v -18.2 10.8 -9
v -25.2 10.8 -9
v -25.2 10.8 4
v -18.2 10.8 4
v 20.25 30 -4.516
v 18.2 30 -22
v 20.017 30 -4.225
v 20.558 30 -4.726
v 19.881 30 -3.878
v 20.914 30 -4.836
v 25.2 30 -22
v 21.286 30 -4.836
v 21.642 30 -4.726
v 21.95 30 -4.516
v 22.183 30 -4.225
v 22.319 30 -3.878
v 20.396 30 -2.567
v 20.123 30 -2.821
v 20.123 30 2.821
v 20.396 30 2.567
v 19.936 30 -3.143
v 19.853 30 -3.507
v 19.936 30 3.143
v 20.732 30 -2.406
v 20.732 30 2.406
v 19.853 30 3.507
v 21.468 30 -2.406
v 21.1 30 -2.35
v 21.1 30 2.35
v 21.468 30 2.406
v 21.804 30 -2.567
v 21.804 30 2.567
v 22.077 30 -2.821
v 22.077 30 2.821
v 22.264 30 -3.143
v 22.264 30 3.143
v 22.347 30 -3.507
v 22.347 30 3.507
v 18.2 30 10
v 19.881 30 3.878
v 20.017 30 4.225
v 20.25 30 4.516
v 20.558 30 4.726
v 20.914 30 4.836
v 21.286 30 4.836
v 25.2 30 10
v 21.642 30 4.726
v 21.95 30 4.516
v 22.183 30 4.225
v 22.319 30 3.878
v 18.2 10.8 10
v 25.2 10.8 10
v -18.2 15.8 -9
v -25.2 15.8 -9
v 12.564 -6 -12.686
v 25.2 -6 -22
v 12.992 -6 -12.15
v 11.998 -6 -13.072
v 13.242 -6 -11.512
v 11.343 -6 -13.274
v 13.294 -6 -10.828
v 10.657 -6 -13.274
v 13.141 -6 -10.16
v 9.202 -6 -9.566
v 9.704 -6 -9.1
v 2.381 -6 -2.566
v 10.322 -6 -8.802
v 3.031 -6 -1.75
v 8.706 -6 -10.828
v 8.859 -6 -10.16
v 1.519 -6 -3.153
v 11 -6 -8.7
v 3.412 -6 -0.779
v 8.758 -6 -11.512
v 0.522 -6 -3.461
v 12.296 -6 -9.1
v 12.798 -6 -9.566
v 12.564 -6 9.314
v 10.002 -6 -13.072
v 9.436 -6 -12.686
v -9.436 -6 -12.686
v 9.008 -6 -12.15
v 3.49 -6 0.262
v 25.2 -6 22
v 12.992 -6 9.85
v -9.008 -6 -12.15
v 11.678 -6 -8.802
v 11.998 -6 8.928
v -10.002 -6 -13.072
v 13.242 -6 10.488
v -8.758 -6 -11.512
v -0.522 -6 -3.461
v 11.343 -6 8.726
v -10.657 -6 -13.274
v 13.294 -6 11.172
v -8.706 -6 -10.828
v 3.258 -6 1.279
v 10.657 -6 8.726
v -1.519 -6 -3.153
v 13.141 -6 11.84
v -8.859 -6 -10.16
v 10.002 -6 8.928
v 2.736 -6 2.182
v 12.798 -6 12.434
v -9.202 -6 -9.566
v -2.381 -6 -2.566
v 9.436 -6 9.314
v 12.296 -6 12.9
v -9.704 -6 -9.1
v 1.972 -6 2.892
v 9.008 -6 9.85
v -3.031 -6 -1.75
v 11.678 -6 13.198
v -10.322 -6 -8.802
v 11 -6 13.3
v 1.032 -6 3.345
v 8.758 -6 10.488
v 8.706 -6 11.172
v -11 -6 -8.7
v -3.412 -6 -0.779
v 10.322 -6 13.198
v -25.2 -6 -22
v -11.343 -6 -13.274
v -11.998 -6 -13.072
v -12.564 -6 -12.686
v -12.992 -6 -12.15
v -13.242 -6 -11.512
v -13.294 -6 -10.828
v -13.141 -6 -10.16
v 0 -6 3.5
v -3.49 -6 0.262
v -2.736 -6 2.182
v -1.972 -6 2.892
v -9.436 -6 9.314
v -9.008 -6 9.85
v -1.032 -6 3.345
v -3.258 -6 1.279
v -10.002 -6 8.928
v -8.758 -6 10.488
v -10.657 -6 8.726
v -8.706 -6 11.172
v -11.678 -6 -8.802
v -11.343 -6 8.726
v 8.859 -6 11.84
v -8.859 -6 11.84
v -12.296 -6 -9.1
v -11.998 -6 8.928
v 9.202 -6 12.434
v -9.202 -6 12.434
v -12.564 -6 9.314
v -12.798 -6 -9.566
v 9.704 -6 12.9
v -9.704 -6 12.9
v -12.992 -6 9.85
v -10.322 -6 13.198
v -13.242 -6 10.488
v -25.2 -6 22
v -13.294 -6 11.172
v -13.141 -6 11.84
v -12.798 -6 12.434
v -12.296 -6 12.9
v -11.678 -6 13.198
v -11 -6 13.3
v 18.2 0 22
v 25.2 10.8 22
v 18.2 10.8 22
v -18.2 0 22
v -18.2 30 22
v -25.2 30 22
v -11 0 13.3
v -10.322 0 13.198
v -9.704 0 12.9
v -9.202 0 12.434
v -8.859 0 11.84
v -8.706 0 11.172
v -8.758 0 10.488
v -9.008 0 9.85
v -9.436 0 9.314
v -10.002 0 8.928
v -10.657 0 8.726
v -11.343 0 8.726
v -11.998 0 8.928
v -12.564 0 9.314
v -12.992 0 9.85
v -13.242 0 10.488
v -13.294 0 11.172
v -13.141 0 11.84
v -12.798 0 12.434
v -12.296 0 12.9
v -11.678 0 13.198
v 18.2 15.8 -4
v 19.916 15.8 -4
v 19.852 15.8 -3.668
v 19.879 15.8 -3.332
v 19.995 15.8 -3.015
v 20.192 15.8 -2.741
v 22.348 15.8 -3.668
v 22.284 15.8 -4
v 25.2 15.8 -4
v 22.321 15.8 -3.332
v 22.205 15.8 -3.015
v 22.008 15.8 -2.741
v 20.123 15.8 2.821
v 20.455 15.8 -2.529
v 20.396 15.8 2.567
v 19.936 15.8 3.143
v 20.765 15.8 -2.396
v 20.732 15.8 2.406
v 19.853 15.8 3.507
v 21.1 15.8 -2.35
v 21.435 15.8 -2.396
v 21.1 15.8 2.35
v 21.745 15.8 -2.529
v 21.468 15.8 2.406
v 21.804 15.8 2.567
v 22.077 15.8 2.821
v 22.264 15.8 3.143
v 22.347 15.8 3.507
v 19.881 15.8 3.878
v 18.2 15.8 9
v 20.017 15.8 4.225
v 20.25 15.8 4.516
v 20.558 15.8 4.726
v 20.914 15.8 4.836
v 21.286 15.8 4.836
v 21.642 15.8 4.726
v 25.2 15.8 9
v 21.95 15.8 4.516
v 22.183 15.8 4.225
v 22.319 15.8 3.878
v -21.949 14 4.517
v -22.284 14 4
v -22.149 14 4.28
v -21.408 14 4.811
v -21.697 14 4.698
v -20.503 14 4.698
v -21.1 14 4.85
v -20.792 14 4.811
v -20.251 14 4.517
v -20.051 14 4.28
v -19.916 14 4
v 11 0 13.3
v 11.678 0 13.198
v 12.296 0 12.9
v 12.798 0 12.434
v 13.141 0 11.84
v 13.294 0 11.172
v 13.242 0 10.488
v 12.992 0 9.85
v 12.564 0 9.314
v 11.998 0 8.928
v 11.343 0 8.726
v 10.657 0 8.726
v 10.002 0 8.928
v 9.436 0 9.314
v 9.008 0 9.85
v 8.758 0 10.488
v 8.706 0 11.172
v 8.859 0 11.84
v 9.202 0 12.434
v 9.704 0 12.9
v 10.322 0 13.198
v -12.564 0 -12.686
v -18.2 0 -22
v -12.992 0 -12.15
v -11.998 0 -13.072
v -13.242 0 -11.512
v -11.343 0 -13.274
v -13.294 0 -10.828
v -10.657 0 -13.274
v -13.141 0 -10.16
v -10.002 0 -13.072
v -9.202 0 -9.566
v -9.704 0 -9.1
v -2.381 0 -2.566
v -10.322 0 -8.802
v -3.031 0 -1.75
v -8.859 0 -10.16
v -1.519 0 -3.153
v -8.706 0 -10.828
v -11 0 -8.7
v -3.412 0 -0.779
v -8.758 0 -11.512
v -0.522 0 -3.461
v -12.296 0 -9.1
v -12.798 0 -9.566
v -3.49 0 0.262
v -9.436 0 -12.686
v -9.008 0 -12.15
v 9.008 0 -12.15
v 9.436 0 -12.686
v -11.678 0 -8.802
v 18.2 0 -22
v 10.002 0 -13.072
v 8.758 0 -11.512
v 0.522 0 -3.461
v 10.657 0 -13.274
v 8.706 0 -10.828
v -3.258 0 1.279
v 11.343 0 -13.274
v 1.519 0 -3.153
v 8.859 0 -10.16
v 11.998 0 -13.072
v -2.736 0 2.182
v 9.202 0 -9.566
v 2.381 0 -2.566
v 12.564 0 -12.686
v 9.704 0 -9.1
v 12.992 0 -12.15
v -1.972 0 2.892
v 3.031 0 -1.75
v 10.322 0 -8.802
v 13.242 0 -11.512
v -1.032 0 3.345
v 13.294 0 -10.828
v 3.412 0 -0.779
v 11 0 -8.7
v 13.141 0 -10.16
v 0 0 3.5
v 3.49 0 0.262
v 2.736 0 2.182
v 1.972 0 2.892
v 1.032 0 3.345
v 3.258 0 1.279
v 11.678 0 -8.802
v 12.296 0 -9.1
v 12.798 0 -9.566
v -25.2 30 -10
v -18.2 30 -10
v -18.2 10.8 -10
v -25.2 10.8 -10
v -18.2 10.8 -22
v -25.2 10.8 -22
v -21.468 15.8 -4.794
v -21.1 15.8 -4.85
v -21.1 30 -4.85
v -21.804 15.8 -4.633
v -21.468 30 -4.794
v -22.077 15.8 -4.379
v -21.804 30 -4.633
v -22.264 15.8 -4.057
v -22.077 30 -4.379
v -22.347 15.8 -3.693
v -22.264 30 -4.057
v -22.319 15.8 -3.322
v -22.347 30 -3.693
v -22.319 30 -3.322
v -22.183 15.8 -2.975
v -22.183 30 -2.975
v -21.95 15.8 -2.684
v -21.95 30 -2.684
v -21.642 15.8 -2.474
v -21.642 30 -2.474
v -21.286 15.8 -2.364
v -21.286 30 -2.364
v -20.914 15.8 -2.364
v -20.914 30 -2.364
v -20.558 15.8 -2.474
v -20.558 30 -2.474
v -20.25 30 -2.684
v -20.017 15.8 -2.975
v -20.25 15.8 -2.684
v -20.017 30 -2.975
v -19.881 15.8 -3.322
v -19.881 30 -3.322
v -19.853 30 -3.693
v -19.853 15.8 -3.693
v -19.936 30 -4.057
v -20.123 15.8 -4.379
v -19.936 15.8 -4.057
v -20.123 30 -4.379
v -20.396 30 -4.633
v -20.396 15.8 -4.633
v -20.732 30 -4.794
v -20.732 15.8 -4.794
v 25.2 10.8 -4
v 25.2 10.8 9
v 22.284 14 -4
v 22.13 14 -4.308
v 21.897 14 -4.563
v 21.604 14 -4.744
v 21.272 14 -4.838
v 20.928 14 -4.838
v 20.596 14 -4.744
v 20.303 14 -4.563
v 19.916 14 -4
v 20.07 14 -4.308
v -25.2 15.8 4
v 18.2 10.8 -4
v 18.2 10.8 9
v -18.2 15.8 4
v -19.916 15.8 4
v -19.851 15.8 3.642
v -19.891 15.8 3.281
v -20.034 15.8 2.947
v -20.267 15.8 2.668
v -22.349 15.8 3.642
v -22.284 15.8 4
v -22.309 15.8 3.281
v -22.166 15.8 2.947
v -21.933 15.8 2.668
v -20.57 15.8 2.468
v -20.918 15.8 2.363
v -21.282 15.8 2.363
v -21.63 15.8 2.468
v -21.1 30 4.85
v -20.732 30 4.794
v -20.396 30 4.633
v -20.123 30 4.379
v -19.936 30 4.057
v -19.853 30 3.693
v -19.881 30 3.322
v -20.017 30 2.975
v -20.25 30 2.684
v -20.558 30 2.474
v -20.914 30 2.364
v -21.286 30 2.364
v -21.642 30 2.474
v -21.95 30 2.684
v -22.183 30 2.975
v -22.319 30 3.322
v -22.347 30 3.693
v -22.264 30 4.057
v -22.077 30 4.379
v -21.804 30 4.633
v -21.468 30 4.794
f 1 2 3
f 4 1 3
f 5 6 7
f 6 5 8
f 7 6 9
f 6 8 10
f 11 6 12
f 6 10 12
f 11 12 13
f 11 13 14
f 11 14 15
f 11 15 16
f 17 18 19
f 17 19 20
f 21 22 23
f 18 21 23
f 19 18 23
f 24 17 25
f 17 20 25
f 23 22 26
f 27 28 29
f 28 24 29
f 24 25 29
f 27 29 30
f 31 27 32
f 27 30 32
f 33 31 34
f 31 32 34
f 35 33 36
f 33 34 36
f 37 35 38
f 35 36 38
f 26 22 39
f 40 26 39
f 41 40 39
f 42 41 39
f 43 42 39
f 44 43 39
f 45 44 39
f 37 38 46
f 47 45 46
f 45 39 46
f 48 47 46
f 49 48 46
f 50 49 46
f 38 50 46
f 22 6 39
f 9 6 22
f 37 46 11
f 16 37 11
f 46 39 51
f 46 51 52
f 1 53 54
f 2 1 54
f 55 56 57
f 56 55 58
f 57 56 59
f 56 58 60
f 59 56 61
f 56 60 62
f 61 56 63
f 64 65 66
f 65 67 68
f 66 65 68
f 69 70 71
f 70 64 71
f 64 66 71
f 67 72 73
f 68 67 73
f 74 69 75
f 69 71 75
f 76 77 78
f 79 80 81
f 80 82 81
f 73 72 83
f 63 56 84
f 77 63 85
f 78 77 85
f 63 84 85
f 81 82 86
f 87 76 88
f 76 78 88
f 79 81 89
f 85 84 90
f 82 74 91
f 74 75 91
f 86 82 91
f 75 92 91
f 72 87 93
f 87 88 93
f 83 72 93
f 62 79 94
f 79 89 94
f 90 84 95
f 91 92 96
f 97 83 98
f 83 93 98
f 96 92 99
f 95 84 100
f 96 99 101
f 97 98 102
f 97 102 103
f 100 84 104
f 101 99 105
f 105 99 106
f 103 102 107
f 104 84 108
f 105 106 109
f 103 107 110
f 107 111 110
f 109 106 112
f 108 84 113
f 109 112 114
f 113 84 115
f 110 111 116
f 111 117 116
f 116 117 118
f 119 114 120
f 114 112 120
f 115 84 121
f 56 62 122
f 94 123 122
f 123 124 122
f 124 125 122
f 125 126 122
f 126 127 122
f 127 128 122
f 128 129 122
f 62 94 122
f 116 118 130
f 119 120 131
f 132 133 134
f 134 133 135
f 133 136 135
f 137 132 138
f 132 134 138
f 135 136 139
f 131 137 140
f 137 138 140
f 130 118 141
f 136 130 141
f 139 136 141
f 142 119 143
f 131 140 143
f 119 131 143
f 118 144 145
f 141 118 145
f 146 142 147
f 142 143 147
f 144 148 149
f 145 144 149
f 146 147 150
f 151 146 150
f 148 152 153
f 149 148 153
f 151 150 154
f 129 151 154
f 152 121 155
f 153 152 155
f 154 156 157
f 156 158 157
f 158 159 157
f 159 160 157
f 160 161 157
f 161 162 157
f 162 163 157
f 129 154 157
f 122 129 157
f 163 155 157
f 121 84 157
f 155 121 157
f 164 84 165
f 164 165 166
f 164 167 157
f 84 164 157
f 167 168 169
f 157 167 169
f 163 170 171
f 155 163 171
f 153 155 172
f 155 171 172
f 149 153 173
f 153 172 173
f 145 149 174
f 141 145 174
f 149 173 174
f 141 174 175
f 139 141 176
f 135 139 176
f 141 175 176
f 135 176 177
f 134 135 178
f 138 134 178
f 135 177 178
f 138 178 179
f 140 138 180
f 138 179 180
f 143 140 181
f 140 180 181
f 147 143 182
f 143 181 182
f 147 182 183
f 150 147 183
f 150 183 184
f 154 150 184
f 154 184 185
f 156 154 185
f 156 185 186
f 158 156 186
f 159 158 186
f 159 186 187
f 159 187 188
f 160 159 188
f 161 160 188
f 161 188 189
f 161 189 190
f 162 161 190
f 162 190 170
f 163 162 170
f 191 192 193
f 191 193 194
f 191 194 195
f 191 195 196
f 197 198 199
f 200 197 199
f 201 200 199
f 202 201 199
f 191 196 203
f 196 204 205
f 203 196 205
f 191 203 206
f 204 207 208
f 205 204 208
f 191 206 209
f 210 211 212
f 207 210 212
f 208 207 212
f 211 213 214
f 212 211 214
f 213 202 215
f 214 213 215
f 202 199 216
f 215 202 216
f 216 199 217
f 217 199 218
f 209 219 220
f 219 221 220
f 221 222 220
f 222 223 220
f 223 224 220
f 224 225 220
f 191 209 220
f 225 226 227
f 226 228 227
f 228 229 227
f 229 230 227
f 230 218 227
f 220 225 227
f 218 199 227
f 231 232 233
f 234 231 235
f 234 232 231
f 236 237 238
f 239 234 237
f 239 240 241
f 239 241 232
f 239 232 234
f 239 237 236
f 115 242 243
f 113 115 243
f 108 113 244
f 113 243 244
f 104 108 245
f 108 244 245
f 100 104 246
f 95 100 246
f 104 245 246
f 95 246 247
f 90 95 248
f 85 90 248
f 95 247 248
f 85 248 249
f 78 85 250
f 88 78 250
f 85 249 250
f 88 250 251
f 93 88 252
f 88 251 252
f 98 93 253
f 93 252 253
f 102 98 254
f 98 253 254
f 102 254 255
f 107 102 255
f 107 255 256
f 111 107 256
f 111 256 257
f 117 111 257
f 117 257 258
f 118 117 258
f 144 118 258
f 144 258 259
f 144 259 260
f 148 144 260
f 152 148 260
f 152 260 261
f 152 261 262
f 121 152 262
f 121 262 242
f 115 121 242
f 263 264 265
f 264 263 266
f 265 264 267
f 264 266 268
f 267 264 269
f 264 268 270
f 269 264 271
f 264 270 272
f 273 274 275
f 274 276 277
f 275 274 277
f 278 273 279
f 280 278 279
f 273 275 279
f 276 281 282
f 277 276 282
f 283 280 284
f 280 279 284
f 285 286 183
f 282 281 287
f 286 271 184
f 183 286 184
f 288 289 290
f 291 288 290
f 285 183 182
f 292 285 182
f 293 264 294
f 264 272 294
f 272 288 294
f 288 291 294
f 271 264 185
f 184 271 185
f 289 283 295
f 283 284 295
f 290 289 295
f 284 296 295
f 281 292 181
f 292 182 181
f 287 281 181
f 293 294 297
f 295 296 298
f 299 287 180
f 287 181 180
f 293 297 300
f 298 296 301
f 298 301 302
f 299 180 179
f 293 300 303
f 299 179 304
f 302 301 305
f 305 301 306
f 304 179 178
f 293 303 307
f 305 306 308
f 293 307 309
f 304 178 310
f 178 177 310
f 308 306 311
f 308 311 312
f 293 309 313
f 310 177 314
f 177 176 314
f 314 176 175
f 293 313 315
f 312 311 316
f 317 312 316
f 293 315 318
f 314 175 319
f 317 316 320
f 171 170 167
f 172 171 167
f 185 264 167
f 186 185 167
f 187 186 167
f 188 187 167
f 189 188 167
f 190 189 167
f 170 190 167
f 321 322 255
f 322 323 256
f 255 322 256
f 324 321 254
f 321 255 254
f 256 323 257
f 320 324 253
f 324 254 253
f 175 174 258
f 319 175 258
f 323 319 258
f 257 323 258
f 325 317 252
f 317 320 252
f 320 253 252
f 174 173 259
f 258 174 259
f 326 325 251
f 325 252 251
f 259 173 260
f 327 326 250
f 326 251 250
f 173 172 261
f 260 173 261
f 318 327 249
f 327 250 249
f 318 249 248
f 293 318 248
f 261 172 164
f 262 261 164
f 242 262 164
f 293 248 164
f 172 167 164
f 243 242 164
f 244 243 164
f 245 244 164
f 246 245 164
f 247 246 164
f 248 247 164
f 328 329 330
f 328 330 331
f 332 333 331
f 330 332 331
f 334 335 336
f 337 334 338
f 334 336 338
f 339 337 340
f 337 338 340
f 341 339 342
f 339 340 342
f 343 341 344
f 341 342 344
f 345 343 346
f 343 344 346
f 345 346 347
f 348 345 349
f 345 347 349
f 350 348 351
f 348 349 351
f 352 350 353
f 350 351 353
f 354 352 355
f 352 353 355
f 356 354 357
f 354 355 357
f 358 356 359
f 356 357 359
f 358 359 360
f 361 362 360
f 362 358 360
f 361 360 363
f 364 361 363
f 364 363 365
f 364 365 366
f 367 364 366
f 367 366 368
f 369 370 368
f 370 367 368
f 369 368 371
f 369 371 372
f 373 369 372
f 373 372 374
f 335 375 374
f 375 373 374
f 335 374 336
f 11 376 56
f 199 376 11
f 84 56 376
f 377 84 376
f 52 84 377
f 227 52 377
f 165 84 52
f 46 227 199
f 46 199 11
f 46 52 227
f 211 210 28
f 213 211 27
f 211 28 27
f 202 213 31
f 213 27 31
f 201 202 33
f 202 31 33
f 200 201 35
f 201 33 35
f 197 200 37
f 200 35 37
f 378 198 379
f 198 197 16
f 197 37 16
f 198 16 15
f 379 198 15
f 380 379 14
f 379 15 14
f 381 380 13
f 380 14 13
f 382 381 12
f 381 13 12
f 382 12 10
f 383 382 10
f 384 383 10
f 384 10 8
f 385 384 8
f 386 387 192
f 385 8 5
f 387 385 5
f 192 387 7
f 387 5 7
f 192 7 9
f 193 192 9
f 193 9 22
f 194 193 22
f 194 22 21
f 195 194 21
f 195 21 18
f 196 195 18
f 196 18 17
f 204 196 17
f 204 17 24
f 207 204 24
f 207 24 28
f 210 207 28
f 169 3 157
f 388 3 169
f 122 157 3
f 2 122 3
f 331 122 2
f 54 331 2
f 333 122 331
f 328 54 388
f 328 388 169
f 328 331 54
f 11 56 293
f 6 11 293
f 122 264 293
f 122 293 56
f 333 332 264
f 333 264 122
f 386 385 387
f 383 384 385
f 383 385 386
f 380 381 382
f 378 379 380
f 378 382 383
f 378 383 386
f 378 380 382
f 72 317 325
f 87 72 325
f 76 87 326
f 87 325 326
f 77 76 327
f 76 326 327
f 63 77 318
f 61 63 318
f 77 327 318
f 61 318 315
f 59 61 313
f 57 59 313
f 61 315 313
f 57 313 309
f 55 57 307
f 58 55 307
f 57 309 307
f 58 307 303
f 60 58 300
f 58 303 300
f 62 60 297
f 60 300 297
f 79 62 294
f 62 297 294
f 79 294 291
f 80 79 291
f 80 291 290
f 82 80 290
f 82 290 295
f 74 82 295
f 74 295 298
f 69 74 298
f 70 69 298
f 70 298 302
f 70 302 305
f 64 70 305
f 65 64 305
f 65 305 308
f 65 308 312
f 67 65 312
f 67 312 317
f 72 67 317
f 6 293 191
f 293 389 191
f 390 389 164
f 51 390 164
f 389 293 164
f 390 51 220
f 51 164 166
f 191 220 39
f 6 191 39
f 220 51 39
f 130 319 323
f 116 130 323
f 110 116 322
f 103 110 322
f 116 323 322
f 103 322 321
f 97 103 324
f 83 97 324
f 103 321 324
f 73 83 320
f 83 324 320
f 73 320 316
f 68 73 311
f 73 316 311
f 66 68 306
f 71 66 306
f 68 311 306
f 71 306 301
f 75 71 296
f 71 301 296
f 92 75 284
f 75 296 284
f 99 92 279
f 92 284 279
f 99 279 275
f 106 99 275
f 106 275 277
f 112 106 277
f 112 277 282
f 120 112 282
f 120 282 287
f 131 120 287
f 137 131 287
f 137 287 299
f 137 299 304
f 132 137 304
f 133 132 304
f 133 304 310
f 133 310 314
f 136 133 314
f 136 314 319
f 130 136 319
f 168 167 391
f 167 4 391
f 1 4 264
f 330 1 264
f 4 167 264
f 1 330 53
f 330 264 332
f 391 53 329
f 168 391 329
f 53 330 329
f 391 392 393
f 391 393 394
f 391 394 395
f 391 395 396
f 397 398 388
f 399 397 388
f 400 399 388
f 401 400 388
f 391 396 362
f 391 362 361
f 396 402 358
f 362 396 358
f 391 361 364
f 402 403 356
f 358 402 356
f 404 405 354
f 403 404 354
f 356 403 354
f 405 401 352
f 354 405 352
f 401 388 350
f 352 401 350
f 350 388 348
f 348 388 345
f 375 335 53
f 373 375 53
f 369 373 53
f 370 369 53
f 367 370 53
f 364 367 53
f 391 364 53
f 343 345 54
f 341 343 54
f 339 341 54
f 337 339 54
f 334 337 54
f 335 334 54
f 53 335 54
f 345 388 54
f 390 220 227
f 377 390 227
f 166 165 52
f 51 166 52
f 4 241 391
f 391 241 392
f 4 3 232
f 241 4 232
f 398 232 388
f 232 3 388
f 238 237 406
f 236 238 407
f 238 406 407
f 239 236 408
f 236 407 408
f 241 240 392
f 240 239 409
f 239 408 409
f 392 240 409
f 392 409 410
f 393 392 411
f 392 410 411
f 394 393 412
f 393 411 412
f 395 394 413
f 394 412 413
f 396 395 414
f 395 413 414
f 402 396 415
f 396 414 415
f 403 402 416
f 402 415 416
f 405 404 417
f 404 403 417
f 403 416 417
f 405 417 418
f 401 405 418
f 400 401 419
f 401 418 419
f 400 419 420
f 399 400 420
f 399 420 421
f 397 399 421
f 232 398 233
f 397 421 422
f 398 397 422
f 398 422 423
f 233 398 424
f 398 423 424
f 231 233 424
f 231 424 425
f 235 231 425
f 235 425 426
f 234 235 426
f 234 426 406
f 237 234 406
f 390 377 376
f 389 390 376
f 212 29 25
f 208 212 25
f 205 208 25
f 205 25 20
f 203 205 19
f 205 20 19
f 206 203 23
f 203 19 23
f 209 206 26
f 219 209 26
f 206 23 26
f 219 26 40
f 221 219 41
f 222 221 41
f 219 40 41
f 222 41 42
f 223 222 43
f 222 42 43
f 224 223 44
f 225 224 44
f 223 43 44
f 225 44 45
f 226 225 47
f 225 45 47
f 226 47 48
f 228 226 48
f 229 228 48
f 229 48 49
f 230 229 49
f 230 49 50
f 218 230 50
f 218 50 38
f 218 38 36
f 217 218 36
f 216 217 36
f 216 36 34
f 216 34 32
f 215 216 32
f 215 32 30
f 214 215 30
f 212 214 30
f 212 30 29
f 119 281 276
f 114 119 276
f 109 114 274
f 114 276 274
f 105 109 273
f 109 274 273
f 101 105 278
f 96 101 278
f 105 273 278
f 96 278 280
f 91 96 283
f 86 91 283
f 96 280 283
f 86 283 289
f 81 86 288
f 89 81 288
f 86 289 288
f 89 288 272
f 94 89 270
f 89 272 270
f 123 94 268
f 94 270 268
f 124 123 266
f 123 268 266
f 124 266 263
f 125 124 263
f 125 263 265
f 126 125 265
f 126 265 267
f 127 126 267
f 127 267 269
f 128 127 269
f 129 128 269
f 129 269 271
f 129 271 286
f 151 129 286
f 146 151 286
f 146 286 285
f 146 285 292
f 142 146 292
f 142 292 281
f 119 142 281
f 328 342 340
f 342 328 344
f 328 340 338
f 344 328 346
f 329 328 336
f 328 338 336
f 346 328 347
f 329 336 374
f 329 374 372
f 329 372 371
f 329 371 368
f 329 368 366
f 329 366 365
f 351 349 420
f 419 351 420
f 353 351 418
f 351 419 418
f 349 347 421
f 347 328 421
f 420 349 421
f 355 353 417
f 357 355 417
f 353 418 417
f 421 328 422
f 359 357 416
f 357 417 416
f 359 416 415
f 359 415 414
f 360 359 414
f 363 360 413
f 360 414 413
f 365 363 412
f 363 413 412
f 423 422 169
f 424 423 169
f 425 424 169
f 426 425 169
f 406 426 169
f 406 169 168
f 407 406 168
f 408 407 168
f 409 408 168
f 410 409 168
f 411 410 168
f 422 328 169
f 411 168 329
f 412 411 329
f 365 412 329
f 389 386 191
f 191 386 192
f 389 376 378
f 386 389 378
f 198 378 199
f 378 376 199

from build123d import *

# Parameters (mm, degrees)
BOSS_EXTRUDE1_DEPTH = 22
SKETCH2_R           = 1.25
CUT_EXTRUDE1_DEPTH  = 16
CUT_EXTRUDE2_REACH  = 64.643
SKETCH3_W           = 12
SKETCH3_H           = 14.2
SKETCH4_W           = 7
SKETCH4_H           = 5
BOSS_EXTRUDE2_DEPTH = 1
CIRPATTERN1_COUNT   = 2
CUT_EXTRUDE3_REACH  = 46.934
SKETCH5_R           = 3.5
SKETCH5_R_2         = 2.3


with BuildPart() as part:
    # Sketch1 → Boss-Extrude1 (new, symmetric)
    with BuildSketch(Plane.XY):
        Polygon((-18.2, 0), (18.2, 0), (18.2, 30), (25.2, 30), (25.2, -6), (-25.2, -6), (-25.2, 30), (-18.2, 30), align=None)
    extrude(amount=BOSS_EXTRUDE1_DEPTH, both=True)

    # Sketch2 → Cut-Extrude1 (cut)
    with BuildSketch(Plane(origin=(0, 30, 0), x_dir=(1, 0, 0), z_dir=(0, 1, 0))):
        with Locations(Location((-21.1, -3.6, 0), (0, 0, 270))):
            Circle(SKETCH2_R)
        with Locations(Location((-21.1, 3.6, 0), (0, 0, 90))):
            Circle(SKETCH2_R)
        with Locations(Location((21.1, 3.6, 0), (0, 0, 270))):
            Circle(SKETCH2_R)
        with Locations(Location((21.1, -3.6, 0), (0, 0, 90))):
            Circle(SKETCH2_R)
    extrude(amount=-CUT_EXTRUDE1_DEPTH, mode=Mode.SUBTRACT)

    # Sketch3 → Cut-Extrude2 (cut, up to next)
    with BuildSketch(Plane(origin=(25.2, 0, 0), x_dir=(0, 0, -1), z_dir=(1, 0, 0)), mode=Mode.PRIVATE) as cut_extrude2_sk1:
        with Locations((-16, 22.9)):
            Rectangle(SKETCH3_W, SKETCH3_H)
    cut_extrude2_tool1 = extrude(cut_extrude2_sk1.sketch, amount=-CUT_EXTRUDE2_REACH, mode=Mode.PRIVATE) & part.part
    # Sketch3 → Cut-Extrude2 (cut, up to next)
    with BuildSketch(Plane(origin=(25.2, 0, 0), x_dir=(0, 0, -1), z_dir=(1, 0, 0)), mode=Mode.PRIVATE) as cut_extrude2_sk2:
        Polygon((-10, 15.8), (-22, 15.8), (-22, 10.8), (4, 10.8), (4, 15.8), align=None)
    cut_extrude2_tool2 = extrude(cut_extrude2_sk2.sketch, amount=-CUT_EXTRUDE2_REACH, mode=Mode.PRIVATE) & part.part
    cut_extrude2_1 = cut_extrude2_tool1.solids().sort_by_distance((25.2, 22.9, 16))[0]
    add(cut_extrude2_1, mode=Mode.SUBTRACT)
    cut_extrude2_2 = cut_extrude2_tool2.solids().sort_by_distance((25.2, 13.3, 9))[0]
    add(cut_extrude2_2, mode=Mode.SUBTRACT)
    cut_extrude2 = cut_extrude2_1 + cut_extrude2_2  # Cut-Extrude2 as one shape, for the pattern or mirror that repeats it

    # Sketch4 → Boss-Extrude2 (add)
    with BuildSketch(Plane.XY.offset(10)):
        with Locations((21.7, 13.3)):
            Rectangle(SKETCH4_W, SKETCH4_H)
    boss_extrude2 = extrude(amount=-BOSS_EXTRUDE2_DEPTH)

    # CirPattern1: Cut-Extrude2, Boss-Extrude2 ×2 about axis
    cirpattern1_axis = Axis((0, -7.8, 0), (0, 1, 0))
    add([cut_extrude2.rotate(cirpattern1_axis, i * 360 / CIRPATTERN1_COUNT) for i in range(1, CIRPATTERN1_COUNT)], mode=Mode.SUBTRACT)
    add([boss_extrude2.rotate(cirpattern1_axis, i * 360 / CIRPATTERN1_COUNT) for i in range(1, CIRPATTERN1_COUNT)])

    # Sketch5 → Cut-Extrude3 (cut, up to next)
    with BuildSketch(Plane(origin=(0, 0, 0), x_dir=(1, 0, 0), z_dir=(0, 1, 0)), mode=Mode.PRIVATE) as cut_extrude3_sk1:
        with Locations(Location((0, 0, 0), (0, 0, 270))):
            Circle(SKETCH5_R)
    cut_extrude3_tool1 = extrude(cut_extrude3_sk1.sketch, amount=-CUT_EXTRUDE3_REACH, mode=Mode.PRIVATE) & part.part
    # Sketch5 → Cut-Extrude3 (cut, up to next)
    with BuildSketch(Plane(origin=(0, 0, 0), x_dir=(1, 0, 0), z_dir=(0, 1, 0)), mode=Mode.PRIVATE) as cut_extrude3_sk2:
        with Locations(Location((-11, 11, 0), (0, 0, 270))):
            Circle(SKETCH5_R_2)
    cut_extrude3_tool2 = extrude(cut_extrude3_sk2.sketch, amount=-CUT_EXTRUDE3_REACH, mode=Mode.PRIVATE) & part.part
    # Sketch5 → Cut-Extrude3 (cut, up to next)
    with BuildSketch(Plane(origin=(0, 0, 0), x_dir=(1, 0, 0), z_dir=(0, 1, 0)), mode=Mode.PRIVATE) as cut_extrude3_sk3:
        with Locations(Location((11, 11, 0), (0, 0, 270))):
            Circle(SKETCH5_R_2)
    cut_extrude3_tool3 = extrude(cut_extrude3_sk3.sketch, amount=-CUT_EXTRUDE3_REACH, mode=Mode.PRIVATE) & part.part
    # Sketch5 → Cut-Extrude3 (cut, up to next)
    with BuildSketch(Plane(origin=(0, 0, 0), x_dir=(1, 0, 0), z_dir=(0, 1, 0)), mode=Mode.PRIVATE) as cut_extrude3_sk4:
        with Locations(Location((11, -11, 0), (0, 0, 270))):
            Circle(SKETCH5_R_2)
    cut_extrude3_tool4 = extrude(cut_extrude3_sk4.sketch, amount=-CUT_EXTRUDE3_REACH, mode=Mode.PRIVATE) & part.part
    # Sketch5 → Cut-Extrude3 (cut, up to next)
    with BuildSketch(Plane(origin=(0, 0, 0), x_dir=(1, 0, 0), z_dir=(0, 1, 0)), mode=Mode.PRIVATE) as cut_extrude3_sk5:
        with Locations(Location((-11, -11, 0), (0, 0, 270))):
            Circle(SKETCH5_R_2)
    cut_extrude3_tool5 = extrude(cut_extrude3_sk5.sketch, amount=-CUT_EXTRUDE3_REACH, mode=Mode.PRIVATE) & part.part
    add(cut_extrude3_tool1.solids().sort_by_distance((0, 0, 0))[0], mode=Mode.SUBTRACT)
    add(cut_extrude3_tool2.solids().sort_by_distance((-11, 0, -11))[0], mode=Mode.SUBTRACT)
    add(cut_extrude3_tool3.solids().sort_by_distance((11, 0, -11))[0], mode=Mode.SUBTRACT)
    add(cut_extrude3_tool4.solids().sort_by_distance((11, 0, 11))[0], mode=Mode.SUBTRACT)
    add(cut_extrude3_tool5.solids().sort_by_distance((-11, 0, 11))[0], mode=Mode.SUBTRACT)


solid = part.part
